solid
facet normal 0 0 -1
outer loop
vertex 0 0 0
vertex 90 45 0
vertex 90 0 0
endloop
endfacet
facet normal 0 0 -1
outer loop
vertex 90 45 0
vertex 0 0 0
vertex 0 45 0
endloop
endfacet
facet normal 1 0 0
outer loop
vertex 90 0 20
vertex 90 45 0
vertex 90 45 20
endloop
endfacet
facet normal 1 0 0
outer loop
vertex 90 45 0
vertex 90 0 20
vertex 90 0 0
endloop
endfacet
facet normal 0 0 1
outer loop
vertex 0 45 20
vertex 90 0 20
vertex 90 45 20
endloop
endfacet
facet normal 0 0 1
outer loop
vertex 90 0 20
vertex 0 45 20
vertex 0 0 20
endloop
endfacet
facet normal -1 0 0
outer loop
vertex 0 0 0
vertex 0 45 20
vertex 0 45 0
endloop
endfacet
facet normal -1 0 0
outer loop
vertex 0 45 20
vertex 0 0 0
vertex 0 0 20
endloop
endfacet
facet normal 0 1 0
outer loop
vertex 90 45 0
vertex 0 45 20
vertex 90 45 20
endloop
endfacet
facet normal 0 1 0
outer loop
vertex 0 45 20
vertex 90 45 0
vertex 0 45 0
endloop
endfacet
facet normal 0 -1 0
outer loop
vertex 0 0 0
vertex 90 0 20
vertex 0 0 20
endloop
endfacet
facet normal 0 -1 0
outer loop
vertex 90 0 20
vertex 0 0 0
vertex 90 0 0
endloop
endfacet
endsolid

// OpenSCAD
// Dimensions in millimetres
block_length = 90;      // X dimension of base block (long side)
block_width = 45;       // Y dimension of base block (short side)
block_height = 20;      // Z height of base block (tall side)
slot_length = 77;       // Slot length along X direction in mm (longer than slide to accommodate)
slot_width = 1.6;        // Slot cross-sectional width along Y direction in mm
slot_depth = 10;         // Slot depth along Z direction from top surface in mm
slot_spacing = 3.5;      // Centre-to-centre spacing between slots along Y direction in mm
num_slots = 10;          // Number of parallel slots (one per slide)

// Base block centered on origin, resting at z=0 and building upward (+Z).
// The block's top face is at z = block_height/2.
translate([block_length/2, block_width/2, block_height/2])
cube([block_length, block_width, block_height], center=true);

// For each slot i (0 to 9), define its position and carve a slot that is open at the top.
for (i = [0:num_slots-1]) {
    // Slot centre in Y direction based on spacing between centres.
    y_offset = (i + 0.5) * slot_spacing;
    
    // Slot start and end positions along X, centered within block width.
    x_start = (block_length - slot_length) / 2;
    x_end   = x_start + slot_length;
    
    // Cut shape: a rectangular prism that removes the slot region.
    // We extend the cut slightly below the intended top surface by 0.01 mm to avoid coplanar faces (rule 5).
    // The cut shape covers:
    //   x in [x_start, x_end]
    //   y in [y_offset - slot_width/2, y_offset + slot_width/2]
    //   z from (block_height/2 - slot_depth) to (block_height/2 - 0.01)
    
    // Use difference() with the cut shape; this ensures no face is exactly coplanar because the cut extends below the original top surface by 0.01 mm.
    difference() {
        // The cutting shape is a rectangular prism that goes down to block_height/2 - 0.01, so its top face is at z = block_height/2 - 0.01, which is not coplanar with the original top surface (z = block_height/2).
        translate([x_start, y_offset, block_height/2 - slot_depth])
        cube([slot_length, slot_width*2, slot_depth + 0.01]);
    }
}
